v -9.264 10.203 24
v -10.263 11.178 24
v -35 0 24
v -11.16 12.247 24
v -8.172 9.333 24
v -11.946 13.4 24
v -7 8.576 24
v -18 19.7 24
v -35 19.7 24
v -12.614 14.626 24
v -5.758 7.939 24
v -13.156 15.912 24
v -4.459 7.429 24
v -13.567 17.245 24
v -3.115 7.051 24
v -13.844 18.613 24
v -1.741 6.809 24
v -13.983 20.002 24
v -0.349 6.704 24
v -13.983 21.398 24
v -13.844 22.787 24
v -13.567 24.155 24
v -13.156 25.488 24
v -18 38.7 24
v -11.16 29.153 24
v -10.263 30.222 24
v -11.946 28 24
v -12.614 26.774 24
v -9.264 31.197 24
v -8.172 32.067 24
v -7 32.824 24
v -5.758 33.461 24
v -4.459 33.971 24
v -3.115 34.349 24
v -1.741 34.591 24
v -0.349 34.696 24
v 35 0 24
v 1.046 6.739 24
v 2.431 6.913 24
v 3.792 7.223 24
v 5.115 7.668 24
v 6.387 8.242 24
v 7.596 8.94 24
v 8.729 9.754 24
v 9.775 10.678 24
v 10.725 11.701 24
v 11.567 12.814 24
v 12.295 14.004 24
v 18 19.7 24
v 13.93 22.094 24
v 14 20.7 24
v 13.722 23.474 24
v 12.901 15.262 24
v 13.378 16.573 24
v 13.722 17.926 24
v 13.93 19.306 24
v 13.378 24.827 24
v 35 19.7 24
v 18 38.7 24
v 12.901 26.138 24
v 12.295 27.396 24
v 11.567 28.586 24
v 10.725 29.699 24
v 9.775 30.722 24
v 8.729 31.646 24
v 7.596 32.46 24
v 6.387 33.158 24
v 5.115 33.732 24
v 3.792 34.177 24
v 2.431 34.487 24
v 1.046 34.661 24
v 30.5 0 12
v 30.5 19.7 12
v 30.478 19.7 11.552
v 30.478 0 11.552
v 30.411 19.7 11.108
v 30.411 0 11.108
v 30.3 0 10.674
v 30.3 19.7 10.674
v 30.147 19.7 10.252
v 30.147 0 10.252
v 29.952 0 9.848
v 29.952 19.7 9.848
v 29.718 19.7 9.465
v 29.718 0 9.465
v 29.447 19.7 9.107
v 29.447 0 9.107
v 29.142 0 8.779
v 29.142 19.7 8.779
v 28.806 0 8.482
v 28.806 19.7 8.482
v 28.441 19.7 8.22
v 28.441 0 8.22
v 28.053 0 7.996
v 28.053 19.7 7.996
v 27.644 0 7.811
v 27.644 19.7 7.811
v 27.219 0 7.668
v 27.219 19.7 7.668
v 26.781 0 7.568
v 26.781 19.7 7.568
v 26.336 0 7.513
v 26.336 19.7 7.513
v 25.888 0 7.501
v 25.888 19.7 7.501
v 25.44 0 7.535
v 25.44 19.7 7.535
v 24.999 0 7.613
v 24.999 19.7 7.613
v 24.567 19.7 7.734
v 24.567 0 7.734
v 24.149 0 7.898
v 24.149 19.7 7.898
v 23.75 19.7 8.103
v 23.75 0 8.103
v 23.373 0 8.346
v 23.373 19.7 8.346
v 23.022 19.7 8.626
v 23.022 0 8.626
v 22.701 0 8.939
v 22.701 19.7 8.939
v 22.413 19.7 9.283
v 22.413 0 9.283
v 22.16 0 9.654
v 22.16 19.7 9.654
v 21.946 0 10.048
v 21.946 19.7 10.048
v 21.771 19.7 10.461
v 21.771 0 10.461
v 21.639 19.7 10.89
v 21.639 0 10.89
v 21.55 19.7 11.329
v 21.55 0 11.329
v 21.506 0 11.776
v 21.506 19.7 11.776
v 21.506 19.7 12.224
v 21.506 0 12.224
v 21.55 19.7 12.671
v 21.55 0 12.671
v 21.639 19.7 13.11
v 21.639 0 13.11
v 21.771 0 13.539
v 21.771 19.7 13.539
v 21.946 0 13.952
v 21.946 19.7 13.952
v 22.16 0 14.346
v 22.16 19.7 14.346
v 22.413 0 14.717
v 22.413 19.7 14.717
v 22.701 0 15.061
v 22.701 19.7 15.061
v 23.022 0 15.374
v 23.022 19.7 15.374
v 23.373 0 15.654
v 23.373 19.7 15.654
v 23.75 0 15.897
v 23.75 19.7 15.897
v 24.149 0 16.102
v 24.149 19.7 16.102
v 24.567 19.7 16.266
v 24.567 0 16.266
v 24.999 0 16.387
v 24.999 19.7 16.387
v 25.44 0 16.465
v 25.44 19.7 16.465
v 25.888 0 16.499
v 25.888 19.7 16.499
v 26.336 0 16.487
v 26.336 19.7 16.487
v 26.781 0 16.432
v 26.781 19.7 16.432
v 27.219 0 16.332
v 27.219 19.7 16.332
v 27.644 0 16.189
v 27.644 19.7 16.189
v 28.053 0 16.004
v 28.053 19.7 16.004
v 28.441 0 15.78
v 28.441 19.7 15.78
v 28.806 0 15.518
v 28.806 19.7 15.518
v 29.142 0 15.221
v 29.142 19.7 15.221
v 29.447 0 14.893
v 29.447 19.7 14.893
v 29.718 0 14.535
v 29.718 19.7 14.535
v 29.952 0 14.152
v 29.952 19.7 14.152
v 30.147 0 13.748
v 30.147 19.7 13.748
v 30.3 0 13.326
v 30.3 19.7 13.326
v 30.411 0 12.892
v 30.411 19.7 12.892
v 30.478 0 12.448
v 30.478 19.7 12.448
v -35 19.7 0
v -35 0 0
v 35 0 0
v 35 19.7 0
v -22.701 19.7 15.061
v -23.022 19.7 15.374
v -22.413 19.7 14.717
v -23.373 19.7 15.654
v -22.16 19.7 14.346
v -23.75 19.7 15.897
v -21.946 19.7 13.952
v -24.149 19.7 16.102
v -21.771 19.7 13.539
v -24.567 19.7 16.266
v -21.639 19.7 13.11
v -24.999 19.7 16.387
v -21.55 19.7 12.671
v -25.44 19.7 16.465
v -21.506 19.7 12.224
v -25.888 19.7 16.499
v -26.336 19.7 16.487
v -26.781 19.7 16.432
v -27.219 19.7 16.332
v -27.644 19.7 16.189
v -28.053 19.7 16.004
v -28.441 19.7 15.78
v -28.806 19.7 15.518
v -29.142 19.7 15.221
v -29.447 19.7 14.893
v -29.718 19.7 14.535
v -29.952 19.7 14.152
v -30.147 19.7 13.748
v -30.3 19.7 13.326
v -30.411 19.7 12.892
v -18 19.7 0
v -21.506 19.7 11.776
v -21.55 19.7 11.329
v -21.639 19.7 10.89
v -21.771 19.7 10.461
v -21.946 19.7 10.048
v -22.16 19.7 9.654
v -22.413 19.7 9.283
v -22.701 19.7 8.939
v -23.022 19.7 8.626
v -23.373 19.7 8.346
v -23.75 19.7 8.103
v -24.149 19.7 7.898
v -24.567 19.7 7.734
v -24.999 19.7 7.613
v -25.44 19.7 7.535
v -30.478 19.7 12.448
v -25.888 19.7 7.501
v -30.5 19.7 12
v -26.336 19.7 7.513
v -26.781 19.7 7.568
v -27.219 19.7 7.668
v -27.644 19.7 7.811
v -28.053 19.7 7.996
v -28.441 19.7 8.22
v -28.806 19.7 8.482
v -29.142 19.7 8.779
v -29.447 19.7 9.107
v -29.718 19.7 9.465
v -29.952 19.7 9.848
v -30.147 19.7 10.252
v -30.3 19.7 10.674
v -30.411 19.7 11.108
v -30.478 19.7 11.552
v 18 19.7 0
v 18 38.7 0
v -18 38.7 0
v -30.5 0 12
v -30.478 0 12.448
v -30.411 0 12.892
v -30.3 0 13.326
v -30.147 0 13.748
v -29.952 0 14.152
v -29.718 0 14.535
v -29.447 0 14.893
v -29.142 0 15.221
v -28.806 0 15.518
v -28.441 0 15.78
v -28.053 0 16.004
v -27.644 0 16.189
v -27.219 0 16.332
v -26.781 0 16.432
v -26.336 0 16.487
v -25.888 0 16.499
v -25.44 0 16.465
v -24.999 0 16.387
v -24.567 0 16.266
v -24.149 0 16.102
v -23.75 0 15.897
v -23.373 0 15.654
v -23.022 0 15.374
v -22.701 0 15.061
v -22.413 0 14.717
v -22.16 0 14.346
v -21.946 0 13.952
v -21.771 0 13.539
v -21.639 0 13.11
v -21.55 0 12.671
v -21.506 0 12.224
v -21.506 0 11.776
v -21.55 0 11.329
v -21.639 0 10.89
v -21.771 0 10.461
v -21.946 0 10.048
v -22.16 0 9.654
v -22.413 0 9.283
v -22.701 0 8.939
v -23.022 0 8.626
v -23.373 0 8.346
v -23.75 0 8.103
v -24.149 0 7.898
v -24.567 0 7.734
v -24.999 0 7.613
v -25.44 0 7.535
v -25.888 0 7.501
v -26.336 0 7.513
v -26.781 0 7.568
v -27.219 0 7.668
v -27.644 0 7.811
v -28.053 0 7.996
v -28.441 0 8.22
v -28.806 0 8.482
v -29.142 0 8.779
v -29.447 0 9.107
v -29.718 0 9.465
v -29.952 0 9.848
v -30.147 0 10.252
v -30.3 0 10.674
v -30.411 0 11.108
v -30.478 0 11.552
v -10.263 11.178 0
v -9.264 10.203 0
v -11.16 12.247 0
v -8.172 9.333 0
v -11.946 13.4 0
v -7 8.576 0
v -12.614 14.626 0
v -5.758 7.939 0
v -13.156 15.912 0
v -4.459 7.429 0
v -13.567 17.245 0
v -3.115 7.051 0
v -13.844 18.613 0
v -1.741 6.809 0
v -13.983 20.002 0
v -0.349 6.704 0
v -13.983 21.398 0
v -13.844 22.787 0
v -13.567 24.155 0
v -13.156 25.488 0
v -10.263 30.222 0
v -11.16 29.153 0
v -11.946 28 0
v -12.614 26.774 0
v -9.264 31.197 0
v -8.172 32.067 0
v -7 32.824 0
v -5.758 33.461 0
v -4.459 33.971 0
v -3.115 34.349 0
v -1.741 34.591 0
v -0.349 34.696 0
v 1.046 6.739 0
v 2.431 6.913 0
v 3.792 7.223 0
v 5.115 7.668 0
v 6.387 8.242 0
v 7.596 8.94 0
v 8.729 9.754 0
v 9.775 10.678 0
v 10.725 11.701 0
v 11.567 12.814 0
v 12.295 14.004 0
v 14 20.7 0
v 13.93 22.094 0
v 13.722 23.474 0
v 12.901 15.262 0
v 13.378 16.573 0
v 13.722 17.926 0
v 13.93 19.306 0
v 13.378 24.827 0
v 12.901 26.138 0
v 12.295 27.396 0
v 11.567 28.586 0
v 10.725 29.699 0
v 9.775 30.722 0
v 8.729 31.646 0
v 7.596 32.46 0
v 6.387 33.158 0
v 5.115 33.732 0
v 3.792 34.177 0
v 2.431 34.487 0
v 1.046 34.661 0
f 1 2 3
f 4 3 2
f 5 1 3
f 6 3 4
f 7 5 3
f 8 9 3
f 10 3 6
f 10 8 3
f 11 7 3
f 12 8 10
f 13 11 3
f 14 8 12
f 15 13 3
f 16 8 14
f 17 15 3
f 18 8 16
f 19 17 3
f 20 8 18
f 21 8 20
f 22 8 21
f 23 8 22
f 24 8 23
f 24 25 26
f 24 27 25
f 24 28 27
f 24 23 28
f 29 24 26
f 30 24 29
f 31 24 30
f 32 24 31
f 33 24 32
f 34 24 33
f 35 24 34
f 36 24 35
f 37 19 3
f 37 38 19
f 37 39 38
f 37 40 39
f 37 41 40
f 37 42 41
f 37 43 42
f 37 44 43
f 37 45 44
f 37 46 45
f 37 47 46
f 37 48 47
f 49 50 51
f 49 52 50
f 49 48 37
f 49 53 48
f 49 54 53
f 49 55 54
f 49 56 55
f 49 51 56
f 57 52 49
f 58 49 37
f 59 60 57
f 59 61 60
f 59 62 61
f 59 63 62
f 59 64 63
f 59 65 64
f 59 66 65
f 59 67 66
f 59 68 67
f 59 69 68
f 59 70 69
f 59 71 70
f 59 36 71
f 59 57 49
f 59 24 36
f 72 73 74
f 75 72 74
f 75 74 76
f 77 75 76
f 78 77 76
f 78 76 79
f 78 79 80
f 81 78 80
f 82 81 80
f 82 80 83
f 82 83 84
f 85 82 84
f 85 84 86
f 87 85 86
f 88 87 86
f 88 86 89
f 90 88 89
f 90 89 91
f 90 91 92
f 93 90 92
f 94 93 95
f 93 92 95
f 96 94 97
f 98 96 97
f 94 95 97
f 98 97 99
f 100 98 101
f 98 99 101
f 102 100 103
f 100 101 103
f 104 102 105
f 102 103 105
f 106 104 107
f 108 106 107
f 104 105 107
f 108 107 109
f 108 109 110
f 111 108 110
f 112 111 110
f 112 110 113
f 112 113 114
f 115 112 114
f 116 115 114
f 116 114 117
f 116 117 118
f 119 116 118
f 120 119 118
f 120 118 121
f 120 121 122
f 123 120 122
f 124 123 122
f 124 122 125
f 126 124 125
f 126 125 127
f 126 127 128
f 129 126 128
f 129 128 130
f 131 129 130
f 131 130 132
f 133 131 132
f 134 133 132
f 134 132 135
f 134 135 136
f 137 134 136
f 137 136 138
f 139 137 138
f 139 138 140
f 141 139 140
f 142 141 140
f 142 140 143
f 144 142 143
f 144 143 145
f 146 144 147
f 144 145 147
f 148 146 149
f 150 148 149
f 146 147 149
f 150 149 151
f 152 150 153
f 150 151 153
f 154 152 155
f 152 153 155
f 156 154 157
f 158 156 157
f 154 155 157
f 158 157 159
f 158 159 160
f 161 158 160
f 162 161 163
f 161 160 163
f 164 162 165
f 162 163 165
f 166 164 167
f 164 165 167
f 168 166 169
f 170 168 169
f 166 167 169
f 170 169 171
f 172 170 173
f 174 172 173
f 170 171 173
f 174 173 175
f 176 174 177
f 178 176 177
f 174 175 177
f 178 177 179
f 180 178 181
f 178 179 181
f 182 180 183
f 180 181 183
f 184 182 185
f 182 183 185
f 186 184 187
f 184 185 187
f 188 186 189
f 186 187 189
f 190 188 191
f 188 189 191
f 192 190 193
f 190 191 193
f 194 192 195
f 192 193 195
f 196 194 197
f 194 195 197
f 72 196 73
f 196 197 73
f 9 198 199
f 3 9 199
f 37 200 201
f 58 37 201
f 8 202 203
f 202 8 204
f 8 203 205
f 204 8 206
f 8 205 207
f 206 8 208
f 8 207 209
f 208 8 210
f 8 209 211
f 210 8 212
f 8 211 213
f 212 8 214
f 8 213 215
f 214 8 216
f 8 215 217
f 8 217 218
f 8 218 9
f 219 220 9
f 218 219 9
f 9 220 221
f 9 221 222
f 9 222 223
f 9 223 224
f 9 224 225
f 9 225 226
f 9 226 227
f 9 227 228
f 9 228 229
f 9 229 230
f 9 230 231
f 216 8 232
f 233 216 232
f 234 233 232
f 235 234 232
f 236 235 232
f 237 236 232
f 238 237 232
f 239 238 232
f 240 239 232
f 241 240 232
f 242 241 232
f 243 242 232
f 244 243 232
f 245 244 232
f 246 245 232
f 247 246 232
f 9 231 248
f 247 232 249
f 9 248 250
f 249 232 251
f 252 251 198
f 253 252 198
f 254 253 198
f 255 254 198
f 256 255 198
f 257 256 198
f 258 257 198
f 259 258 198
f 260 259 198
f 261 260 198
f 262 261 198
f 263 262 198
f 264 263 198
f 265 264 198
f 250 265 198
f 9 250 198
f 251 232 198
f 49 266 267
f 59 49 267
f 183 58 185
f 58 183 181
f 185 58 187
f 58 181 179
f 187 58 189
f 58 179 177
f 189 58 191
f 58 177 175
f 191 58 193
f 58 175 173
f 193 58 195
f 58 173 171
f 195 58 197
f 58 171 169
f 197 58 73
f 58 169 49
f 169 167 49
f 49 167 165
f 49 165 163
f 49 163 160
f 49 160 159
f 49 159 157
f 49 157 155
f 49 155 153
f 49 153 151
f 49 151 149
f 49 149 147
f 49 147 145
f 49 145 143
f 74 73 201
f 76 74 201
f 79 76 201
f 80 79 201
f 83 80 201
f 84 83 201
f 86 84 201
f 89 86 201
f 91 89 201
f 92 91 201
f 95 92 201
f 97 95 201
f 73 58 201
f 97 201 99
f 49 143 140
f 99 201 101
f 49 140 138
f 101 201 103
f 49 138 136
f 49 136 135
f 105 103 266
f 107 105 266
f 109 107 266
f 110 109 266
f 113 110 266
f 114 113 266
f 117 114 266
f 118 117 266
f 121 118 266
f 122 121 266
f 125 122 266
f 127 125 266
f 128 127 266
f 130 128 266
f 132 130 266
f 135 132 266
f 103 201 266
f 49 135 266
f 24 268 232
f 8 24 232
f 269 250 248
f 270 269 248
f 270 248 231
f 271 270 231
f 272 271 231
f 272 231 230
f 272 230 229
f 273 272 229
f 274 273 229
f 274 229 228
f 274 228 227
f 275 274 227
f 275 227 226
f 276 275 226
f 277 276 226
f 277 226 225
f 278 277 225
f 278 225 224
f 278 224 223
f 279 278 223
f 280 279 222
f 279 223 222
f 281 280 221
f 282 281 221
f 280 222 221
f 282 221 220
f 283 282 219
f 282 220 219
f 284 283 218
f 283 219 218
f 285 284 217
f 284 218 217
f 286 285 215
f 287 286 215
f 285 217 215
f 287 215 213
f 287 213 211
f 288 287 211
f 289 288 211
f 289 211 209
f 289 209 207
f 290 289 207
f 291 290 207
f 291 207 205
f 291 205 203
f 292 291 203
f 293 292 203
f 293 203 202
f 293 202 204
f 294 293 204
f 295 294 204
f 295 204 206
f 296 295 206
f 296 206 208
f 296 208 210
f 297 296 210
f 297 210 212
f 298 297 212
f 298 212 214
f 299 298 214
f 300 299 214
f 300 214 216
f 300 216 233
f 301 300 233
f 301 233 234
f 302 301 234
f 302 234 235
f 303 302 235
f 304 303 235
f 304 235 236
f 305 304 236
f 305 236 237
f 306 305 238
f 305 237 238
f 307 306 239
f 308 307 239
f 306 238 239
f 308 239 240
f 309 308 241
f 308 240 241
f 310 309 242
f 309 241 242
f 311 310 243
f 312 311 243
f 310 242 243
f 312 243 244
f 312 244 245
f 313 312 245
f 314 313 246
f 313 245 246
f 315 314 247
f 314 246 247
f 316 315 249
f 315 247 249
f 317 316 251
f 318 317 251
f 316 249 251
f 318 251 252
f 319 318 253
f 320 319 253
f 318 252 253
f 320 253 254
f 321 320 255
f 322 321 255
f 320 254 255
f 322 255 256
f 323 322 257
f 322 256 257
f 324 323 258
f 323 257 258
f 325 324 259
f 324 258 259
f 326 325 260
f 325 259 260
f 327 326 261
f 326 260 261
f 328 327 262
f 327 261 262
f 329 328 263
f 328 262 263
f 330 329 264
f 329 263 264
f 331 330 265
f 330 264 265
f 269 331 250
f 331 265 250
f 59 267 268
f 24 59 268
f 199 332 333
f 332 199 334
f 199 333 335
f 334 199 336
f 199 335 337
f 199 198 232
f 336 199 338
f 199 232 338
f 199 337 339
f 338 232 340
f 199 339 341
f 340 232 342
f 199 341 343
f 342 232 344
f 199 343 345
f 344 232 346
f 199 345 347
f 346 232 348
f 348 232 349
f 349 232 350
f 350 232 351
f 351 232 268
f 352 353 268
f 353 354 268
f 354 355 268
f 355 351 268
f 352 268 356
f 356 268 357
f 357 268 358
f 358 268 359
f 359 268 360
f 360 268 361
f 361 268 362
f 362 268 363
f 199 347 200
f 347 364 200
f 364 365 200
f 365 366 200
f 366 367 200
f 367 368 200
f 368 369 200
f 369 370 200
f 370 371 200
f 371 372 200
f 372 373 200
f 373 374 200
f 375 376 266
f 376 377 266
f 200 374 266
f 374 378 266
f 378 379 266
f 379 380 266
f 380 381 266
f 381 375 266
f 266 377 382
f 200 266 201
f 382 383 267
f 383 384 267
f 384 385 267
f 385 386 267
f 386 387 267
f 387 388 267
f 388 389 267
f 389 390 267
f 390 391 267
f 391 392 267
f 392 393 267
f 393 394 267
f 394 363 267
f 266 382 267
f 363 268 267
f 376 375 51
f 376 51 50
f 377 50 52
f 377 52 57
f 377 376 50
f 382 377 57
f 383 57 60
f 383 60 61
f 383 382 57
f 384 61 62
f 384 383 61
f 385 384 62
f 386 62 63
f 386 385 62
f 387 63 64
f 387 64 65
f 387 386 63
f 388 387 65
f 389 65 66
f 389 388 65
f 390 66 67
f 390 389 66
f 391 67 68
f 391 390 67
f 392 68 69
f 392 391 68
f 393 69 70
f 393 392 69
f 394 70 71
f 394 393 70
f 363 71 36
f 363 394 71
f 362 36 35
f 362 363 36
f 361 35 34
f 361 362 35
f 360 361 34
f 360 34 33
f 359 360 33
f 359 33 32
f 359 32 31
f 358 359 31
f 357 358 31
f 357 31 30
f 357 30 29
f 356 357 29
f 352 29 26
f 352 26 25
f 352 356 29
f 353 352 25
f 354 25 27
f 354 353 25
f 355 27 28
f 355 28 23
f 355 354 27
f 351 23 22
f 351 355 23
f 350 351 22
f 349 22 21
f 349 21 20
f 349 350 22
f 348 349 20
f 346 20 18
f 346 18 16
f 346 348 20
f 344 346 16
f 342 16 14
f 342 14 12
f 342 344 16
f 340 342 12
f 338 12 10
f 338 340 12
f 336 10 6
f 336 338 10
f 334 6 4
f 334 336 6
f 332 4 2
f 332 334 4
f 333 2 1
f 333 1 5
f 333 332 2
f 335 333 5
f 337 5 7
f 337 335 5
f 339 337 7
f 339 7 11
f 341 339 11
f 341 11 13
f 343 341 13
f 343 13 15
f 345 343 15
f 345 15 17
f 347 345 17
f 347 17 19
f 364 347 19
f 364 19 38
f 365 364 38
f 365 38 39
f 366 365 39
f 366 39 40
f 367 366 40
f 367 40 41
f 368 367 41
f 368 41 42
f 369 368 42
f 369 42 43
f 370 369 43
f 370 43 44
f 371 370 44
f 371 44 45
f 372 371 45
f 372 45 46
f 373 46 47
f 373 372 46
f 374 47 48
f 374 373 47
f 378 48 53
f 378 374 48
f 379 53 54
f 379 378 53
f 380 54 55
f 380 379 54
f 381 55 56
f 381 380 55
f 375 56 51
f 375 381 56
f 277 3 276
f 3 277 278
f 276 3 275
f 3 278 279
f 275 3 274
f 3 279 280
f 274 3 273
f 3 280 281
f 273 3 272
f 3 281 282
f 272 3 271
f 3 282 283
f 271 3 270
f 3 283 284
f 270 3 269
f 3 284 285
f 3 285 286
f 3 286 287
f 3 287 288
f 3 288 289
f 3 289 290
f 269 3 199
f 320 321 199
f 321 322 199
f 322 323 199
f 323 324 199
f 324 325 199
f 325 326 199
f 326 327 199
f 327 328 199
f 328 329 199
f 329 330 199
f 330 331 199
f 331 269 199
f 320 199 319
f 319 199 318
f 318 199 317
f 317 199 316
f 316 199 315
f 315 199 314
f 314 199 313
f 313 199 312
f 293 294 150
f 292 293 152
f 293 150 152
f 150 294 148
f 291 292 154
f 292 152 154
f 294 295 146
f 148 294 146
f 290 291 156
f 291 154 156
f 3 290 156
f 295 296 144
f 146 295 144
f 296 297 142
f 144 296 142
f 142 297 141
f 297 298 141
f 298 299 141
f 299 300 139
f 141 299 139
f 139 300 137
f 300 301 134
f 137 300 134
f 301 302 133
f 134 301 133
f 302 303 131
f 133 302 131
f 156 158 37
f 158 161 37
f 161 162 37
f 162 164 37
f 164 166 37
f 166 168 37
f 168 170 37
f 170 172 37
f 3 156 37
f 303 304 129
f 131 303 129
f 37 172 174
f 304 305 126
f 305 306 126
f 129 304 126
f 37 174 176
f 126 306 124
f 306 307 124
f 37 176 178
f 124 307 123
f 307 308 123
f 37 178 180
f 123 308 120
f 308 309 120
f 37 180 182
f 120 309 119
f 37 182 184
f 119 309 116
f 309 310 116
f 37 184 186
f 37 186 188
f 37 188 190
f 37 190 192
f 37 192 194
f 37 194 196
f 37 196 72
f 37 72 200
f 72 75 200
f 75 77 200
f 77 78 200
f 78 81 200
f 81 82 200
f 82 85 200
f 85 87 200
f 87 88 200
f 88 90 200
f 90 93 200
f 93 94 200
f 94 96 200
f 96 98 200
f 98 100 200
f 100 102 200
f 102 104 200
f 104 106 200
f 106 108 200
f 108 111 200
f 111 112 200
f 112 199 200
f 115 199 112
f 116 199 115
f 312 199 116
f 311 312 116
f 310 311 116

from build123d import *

# Parameters (mm, degrees)
ESBO_O1_R                = 14
RESSALTO_EXTRUS_O3_DEPTH = 24
SKETCH2_R                = 4.5
CUT_EXTRUDE1_DEPTH       = 47.787712062


with BuildPart() as part:
    # Esboço1 → Ressalto-extrusão3 (new body)
    with BuildSketch(Plane.XY):
        Polygon((-35, 0), (35, 0), (35, 19.7), (18, 19.7), (18, 38.7), (-18, 38.7), (-18, 19.7), (-35, 19.7), align=None)
        with Locations((0, 20.7)):
            Circle(ESBO_O1_R, mode=Mode.SUBTRACT)
    extrude(amount=RESSALTO_EXTRUS_O3_DEPTH)

    # Sketch2 → Cut-Extrude1 (cut, through all)
    with BuildSketch(Plane(origin=(0, 19.7, 0), x_dir=(1, 0, 0), z_dir=(0, 1, 0))):
        with Locations(Location((-26, -12, 0), (0, 0, 180))):
            Circle(SKETCH2_R)
        with Locations((26, -12)):
            Circle(SKETCH2_R)
    extrude(amount=-CUT_EXTRUDE1_DEPTH, mode=Mode.SUBTRACT)


solid = part.part
